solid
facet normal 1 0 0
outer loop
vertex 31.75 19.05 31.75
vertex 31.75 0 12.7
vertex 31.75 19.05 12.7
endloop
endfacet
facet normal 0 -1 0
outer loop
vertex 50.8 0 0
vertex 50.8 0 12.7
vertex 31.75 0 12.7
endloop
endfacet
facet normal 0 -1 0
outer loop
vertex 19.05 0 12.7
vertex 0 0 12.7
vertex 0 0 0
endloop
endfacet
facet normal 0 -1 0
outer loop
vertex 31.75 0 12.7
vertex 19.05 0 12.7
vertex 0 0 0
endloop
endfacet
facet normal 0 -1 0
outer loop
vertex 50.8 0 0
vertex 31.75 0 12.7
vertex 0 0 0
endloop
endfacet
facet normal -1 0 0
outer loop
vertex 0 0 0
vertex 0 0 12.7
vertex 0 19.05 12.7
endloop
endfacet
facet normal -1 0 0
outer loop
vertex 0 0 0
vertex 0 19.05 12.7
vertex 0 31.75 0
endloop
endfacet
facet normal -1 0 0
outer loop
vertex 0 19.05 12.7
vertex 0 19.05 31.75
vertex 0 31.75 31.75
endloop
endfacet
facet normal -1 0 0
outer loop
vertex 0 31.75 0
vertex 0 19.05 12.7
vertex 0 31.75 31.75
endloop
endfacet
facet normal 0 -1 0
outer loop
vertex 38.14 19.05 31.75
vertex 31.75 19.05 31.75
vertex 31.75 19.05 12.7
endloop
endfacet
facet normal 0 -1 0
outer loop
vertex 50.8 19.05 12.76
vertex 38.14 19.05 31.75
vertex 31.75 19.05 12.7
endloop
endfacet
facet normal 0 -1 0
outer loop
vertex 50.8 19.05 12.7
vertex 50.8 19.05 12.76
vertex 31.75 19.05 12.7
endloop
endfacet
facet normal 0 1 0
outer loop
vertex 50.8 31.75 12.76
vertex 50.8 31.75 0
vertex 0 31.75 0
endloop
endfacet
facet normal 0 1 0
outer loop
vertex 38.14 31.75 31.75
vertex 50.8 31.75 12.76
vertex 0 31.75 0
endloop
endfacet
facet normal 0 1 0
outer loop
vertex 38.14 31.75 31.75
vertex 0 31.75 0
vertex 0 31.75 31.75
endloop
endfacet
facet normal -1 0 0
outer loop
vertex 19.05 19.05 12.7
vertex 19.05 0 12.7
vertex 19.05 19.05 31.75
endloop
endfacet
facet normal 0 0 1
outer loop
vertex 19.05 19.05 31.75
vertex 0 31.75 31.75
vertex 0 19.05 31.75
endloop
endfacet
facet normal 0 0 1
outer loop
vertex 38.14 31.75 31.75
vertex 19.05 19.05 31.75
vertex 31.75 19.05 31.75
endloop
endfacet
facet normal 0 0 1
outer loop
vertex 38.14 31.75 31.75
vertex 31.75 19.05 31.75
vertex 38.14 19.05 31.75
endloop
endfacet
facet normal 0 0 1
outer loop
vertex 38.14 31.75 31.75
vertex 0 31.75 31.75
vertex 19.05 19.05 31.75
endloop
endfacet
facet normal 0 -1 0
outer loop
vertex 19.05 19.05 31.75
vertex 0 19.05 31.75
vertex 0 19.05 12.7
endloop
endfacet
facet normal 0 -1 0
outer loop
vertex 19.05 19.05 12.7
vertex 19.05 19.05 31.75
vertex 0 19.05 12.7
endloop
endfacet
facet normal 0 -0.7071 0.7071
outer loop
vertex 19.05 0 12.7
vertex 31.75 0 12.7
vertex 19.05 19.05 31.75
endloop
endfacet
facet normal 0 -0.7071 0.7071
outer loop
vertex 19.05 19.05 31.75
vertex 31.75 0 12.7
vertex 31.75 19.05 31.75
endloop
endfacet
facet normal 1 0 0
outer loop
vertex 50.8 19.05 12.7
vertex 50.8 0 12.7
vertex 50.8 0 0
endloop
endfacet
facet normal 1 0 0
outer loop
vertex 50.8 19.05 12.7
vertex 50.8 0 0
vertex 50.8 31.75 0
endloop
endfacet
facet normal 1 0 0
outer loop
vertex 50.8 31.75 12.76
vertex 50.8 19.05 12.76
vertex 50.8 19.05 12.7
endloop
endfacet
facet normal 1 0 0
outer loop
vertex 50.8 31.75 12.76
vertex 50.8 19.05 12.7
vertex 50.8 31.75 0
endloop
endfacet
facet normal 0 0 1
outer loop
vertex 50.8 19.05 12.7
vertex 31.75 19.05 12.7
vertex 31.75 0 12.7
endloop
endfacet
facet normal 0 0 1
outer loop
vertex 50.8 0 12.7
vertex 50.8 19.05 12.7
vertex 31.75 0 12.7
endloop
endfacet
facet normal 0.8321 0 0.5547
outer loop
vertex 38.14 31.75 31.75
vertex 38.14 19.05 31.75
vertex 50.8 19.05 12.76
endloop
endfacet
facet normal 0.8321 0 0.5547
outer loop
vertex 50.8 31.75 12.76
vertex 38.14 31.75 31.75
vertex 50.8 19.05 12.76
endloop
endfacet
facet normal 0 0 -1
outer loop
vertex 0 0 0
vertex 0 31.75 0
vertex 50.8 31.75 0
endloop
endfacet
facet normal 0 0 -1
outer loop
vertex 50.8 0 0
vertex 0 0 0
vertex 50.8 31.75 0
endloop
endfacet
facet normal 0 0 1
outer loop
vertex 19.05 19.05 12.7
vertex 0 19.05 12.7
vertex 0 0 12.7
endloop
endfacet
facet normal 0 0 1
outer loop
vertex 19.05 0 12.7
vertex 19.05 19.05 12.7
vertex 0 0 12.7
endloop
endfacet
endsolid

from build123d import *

# Parameters (mm, degrees)
F1_DEPTH = 50.8
F3_DEPTH = 31.75
F4_W     = 12.7
F4_H     = 19.05
F5_DEPTH = 31.75
F7_DEPTH = 25.4


with BuildPart() as f1:
    # F0 (on Right) → F1 (new body)
    with BuildSketch(Plane.YZ):
        Polygon((0, 12.7), (0, 0), (31.75, 0), (31.75, 31.75), (19.05, 31.75), (19.05, 12.7), align=None)
    extrude(amount=F1_DEPTH)

    # F2 (on Front) → F3 (cut)
    with BuildSketch(Plane.XZ):
        Polygon((50.8, 12.760184), (50.8, 31.810184), (38.1, 31.810184), align=None)
    extrude(amount=-F3_DEPTH, mode=Mode.SUBTRACT)

    # F4 (on Top) → F5 (join)
    with BuildSketch(Plane.XY):
        with Locations((25.4, 9.525)):
            Rectangle(F4_W, F4_H)
    extrude(amount=F5_DEPTH)

    # F6 (on face) → F7 (cut)
    with BuildSketch(Plane.YZ.offset(31.75)):
        Polygon((0, 12.7), (19.05, 31.75), (0, 31.75), align=None)
    extrude(amount=-F7_DEPTH, mode=Mode.SUBTRACT)


solid = f1.part
